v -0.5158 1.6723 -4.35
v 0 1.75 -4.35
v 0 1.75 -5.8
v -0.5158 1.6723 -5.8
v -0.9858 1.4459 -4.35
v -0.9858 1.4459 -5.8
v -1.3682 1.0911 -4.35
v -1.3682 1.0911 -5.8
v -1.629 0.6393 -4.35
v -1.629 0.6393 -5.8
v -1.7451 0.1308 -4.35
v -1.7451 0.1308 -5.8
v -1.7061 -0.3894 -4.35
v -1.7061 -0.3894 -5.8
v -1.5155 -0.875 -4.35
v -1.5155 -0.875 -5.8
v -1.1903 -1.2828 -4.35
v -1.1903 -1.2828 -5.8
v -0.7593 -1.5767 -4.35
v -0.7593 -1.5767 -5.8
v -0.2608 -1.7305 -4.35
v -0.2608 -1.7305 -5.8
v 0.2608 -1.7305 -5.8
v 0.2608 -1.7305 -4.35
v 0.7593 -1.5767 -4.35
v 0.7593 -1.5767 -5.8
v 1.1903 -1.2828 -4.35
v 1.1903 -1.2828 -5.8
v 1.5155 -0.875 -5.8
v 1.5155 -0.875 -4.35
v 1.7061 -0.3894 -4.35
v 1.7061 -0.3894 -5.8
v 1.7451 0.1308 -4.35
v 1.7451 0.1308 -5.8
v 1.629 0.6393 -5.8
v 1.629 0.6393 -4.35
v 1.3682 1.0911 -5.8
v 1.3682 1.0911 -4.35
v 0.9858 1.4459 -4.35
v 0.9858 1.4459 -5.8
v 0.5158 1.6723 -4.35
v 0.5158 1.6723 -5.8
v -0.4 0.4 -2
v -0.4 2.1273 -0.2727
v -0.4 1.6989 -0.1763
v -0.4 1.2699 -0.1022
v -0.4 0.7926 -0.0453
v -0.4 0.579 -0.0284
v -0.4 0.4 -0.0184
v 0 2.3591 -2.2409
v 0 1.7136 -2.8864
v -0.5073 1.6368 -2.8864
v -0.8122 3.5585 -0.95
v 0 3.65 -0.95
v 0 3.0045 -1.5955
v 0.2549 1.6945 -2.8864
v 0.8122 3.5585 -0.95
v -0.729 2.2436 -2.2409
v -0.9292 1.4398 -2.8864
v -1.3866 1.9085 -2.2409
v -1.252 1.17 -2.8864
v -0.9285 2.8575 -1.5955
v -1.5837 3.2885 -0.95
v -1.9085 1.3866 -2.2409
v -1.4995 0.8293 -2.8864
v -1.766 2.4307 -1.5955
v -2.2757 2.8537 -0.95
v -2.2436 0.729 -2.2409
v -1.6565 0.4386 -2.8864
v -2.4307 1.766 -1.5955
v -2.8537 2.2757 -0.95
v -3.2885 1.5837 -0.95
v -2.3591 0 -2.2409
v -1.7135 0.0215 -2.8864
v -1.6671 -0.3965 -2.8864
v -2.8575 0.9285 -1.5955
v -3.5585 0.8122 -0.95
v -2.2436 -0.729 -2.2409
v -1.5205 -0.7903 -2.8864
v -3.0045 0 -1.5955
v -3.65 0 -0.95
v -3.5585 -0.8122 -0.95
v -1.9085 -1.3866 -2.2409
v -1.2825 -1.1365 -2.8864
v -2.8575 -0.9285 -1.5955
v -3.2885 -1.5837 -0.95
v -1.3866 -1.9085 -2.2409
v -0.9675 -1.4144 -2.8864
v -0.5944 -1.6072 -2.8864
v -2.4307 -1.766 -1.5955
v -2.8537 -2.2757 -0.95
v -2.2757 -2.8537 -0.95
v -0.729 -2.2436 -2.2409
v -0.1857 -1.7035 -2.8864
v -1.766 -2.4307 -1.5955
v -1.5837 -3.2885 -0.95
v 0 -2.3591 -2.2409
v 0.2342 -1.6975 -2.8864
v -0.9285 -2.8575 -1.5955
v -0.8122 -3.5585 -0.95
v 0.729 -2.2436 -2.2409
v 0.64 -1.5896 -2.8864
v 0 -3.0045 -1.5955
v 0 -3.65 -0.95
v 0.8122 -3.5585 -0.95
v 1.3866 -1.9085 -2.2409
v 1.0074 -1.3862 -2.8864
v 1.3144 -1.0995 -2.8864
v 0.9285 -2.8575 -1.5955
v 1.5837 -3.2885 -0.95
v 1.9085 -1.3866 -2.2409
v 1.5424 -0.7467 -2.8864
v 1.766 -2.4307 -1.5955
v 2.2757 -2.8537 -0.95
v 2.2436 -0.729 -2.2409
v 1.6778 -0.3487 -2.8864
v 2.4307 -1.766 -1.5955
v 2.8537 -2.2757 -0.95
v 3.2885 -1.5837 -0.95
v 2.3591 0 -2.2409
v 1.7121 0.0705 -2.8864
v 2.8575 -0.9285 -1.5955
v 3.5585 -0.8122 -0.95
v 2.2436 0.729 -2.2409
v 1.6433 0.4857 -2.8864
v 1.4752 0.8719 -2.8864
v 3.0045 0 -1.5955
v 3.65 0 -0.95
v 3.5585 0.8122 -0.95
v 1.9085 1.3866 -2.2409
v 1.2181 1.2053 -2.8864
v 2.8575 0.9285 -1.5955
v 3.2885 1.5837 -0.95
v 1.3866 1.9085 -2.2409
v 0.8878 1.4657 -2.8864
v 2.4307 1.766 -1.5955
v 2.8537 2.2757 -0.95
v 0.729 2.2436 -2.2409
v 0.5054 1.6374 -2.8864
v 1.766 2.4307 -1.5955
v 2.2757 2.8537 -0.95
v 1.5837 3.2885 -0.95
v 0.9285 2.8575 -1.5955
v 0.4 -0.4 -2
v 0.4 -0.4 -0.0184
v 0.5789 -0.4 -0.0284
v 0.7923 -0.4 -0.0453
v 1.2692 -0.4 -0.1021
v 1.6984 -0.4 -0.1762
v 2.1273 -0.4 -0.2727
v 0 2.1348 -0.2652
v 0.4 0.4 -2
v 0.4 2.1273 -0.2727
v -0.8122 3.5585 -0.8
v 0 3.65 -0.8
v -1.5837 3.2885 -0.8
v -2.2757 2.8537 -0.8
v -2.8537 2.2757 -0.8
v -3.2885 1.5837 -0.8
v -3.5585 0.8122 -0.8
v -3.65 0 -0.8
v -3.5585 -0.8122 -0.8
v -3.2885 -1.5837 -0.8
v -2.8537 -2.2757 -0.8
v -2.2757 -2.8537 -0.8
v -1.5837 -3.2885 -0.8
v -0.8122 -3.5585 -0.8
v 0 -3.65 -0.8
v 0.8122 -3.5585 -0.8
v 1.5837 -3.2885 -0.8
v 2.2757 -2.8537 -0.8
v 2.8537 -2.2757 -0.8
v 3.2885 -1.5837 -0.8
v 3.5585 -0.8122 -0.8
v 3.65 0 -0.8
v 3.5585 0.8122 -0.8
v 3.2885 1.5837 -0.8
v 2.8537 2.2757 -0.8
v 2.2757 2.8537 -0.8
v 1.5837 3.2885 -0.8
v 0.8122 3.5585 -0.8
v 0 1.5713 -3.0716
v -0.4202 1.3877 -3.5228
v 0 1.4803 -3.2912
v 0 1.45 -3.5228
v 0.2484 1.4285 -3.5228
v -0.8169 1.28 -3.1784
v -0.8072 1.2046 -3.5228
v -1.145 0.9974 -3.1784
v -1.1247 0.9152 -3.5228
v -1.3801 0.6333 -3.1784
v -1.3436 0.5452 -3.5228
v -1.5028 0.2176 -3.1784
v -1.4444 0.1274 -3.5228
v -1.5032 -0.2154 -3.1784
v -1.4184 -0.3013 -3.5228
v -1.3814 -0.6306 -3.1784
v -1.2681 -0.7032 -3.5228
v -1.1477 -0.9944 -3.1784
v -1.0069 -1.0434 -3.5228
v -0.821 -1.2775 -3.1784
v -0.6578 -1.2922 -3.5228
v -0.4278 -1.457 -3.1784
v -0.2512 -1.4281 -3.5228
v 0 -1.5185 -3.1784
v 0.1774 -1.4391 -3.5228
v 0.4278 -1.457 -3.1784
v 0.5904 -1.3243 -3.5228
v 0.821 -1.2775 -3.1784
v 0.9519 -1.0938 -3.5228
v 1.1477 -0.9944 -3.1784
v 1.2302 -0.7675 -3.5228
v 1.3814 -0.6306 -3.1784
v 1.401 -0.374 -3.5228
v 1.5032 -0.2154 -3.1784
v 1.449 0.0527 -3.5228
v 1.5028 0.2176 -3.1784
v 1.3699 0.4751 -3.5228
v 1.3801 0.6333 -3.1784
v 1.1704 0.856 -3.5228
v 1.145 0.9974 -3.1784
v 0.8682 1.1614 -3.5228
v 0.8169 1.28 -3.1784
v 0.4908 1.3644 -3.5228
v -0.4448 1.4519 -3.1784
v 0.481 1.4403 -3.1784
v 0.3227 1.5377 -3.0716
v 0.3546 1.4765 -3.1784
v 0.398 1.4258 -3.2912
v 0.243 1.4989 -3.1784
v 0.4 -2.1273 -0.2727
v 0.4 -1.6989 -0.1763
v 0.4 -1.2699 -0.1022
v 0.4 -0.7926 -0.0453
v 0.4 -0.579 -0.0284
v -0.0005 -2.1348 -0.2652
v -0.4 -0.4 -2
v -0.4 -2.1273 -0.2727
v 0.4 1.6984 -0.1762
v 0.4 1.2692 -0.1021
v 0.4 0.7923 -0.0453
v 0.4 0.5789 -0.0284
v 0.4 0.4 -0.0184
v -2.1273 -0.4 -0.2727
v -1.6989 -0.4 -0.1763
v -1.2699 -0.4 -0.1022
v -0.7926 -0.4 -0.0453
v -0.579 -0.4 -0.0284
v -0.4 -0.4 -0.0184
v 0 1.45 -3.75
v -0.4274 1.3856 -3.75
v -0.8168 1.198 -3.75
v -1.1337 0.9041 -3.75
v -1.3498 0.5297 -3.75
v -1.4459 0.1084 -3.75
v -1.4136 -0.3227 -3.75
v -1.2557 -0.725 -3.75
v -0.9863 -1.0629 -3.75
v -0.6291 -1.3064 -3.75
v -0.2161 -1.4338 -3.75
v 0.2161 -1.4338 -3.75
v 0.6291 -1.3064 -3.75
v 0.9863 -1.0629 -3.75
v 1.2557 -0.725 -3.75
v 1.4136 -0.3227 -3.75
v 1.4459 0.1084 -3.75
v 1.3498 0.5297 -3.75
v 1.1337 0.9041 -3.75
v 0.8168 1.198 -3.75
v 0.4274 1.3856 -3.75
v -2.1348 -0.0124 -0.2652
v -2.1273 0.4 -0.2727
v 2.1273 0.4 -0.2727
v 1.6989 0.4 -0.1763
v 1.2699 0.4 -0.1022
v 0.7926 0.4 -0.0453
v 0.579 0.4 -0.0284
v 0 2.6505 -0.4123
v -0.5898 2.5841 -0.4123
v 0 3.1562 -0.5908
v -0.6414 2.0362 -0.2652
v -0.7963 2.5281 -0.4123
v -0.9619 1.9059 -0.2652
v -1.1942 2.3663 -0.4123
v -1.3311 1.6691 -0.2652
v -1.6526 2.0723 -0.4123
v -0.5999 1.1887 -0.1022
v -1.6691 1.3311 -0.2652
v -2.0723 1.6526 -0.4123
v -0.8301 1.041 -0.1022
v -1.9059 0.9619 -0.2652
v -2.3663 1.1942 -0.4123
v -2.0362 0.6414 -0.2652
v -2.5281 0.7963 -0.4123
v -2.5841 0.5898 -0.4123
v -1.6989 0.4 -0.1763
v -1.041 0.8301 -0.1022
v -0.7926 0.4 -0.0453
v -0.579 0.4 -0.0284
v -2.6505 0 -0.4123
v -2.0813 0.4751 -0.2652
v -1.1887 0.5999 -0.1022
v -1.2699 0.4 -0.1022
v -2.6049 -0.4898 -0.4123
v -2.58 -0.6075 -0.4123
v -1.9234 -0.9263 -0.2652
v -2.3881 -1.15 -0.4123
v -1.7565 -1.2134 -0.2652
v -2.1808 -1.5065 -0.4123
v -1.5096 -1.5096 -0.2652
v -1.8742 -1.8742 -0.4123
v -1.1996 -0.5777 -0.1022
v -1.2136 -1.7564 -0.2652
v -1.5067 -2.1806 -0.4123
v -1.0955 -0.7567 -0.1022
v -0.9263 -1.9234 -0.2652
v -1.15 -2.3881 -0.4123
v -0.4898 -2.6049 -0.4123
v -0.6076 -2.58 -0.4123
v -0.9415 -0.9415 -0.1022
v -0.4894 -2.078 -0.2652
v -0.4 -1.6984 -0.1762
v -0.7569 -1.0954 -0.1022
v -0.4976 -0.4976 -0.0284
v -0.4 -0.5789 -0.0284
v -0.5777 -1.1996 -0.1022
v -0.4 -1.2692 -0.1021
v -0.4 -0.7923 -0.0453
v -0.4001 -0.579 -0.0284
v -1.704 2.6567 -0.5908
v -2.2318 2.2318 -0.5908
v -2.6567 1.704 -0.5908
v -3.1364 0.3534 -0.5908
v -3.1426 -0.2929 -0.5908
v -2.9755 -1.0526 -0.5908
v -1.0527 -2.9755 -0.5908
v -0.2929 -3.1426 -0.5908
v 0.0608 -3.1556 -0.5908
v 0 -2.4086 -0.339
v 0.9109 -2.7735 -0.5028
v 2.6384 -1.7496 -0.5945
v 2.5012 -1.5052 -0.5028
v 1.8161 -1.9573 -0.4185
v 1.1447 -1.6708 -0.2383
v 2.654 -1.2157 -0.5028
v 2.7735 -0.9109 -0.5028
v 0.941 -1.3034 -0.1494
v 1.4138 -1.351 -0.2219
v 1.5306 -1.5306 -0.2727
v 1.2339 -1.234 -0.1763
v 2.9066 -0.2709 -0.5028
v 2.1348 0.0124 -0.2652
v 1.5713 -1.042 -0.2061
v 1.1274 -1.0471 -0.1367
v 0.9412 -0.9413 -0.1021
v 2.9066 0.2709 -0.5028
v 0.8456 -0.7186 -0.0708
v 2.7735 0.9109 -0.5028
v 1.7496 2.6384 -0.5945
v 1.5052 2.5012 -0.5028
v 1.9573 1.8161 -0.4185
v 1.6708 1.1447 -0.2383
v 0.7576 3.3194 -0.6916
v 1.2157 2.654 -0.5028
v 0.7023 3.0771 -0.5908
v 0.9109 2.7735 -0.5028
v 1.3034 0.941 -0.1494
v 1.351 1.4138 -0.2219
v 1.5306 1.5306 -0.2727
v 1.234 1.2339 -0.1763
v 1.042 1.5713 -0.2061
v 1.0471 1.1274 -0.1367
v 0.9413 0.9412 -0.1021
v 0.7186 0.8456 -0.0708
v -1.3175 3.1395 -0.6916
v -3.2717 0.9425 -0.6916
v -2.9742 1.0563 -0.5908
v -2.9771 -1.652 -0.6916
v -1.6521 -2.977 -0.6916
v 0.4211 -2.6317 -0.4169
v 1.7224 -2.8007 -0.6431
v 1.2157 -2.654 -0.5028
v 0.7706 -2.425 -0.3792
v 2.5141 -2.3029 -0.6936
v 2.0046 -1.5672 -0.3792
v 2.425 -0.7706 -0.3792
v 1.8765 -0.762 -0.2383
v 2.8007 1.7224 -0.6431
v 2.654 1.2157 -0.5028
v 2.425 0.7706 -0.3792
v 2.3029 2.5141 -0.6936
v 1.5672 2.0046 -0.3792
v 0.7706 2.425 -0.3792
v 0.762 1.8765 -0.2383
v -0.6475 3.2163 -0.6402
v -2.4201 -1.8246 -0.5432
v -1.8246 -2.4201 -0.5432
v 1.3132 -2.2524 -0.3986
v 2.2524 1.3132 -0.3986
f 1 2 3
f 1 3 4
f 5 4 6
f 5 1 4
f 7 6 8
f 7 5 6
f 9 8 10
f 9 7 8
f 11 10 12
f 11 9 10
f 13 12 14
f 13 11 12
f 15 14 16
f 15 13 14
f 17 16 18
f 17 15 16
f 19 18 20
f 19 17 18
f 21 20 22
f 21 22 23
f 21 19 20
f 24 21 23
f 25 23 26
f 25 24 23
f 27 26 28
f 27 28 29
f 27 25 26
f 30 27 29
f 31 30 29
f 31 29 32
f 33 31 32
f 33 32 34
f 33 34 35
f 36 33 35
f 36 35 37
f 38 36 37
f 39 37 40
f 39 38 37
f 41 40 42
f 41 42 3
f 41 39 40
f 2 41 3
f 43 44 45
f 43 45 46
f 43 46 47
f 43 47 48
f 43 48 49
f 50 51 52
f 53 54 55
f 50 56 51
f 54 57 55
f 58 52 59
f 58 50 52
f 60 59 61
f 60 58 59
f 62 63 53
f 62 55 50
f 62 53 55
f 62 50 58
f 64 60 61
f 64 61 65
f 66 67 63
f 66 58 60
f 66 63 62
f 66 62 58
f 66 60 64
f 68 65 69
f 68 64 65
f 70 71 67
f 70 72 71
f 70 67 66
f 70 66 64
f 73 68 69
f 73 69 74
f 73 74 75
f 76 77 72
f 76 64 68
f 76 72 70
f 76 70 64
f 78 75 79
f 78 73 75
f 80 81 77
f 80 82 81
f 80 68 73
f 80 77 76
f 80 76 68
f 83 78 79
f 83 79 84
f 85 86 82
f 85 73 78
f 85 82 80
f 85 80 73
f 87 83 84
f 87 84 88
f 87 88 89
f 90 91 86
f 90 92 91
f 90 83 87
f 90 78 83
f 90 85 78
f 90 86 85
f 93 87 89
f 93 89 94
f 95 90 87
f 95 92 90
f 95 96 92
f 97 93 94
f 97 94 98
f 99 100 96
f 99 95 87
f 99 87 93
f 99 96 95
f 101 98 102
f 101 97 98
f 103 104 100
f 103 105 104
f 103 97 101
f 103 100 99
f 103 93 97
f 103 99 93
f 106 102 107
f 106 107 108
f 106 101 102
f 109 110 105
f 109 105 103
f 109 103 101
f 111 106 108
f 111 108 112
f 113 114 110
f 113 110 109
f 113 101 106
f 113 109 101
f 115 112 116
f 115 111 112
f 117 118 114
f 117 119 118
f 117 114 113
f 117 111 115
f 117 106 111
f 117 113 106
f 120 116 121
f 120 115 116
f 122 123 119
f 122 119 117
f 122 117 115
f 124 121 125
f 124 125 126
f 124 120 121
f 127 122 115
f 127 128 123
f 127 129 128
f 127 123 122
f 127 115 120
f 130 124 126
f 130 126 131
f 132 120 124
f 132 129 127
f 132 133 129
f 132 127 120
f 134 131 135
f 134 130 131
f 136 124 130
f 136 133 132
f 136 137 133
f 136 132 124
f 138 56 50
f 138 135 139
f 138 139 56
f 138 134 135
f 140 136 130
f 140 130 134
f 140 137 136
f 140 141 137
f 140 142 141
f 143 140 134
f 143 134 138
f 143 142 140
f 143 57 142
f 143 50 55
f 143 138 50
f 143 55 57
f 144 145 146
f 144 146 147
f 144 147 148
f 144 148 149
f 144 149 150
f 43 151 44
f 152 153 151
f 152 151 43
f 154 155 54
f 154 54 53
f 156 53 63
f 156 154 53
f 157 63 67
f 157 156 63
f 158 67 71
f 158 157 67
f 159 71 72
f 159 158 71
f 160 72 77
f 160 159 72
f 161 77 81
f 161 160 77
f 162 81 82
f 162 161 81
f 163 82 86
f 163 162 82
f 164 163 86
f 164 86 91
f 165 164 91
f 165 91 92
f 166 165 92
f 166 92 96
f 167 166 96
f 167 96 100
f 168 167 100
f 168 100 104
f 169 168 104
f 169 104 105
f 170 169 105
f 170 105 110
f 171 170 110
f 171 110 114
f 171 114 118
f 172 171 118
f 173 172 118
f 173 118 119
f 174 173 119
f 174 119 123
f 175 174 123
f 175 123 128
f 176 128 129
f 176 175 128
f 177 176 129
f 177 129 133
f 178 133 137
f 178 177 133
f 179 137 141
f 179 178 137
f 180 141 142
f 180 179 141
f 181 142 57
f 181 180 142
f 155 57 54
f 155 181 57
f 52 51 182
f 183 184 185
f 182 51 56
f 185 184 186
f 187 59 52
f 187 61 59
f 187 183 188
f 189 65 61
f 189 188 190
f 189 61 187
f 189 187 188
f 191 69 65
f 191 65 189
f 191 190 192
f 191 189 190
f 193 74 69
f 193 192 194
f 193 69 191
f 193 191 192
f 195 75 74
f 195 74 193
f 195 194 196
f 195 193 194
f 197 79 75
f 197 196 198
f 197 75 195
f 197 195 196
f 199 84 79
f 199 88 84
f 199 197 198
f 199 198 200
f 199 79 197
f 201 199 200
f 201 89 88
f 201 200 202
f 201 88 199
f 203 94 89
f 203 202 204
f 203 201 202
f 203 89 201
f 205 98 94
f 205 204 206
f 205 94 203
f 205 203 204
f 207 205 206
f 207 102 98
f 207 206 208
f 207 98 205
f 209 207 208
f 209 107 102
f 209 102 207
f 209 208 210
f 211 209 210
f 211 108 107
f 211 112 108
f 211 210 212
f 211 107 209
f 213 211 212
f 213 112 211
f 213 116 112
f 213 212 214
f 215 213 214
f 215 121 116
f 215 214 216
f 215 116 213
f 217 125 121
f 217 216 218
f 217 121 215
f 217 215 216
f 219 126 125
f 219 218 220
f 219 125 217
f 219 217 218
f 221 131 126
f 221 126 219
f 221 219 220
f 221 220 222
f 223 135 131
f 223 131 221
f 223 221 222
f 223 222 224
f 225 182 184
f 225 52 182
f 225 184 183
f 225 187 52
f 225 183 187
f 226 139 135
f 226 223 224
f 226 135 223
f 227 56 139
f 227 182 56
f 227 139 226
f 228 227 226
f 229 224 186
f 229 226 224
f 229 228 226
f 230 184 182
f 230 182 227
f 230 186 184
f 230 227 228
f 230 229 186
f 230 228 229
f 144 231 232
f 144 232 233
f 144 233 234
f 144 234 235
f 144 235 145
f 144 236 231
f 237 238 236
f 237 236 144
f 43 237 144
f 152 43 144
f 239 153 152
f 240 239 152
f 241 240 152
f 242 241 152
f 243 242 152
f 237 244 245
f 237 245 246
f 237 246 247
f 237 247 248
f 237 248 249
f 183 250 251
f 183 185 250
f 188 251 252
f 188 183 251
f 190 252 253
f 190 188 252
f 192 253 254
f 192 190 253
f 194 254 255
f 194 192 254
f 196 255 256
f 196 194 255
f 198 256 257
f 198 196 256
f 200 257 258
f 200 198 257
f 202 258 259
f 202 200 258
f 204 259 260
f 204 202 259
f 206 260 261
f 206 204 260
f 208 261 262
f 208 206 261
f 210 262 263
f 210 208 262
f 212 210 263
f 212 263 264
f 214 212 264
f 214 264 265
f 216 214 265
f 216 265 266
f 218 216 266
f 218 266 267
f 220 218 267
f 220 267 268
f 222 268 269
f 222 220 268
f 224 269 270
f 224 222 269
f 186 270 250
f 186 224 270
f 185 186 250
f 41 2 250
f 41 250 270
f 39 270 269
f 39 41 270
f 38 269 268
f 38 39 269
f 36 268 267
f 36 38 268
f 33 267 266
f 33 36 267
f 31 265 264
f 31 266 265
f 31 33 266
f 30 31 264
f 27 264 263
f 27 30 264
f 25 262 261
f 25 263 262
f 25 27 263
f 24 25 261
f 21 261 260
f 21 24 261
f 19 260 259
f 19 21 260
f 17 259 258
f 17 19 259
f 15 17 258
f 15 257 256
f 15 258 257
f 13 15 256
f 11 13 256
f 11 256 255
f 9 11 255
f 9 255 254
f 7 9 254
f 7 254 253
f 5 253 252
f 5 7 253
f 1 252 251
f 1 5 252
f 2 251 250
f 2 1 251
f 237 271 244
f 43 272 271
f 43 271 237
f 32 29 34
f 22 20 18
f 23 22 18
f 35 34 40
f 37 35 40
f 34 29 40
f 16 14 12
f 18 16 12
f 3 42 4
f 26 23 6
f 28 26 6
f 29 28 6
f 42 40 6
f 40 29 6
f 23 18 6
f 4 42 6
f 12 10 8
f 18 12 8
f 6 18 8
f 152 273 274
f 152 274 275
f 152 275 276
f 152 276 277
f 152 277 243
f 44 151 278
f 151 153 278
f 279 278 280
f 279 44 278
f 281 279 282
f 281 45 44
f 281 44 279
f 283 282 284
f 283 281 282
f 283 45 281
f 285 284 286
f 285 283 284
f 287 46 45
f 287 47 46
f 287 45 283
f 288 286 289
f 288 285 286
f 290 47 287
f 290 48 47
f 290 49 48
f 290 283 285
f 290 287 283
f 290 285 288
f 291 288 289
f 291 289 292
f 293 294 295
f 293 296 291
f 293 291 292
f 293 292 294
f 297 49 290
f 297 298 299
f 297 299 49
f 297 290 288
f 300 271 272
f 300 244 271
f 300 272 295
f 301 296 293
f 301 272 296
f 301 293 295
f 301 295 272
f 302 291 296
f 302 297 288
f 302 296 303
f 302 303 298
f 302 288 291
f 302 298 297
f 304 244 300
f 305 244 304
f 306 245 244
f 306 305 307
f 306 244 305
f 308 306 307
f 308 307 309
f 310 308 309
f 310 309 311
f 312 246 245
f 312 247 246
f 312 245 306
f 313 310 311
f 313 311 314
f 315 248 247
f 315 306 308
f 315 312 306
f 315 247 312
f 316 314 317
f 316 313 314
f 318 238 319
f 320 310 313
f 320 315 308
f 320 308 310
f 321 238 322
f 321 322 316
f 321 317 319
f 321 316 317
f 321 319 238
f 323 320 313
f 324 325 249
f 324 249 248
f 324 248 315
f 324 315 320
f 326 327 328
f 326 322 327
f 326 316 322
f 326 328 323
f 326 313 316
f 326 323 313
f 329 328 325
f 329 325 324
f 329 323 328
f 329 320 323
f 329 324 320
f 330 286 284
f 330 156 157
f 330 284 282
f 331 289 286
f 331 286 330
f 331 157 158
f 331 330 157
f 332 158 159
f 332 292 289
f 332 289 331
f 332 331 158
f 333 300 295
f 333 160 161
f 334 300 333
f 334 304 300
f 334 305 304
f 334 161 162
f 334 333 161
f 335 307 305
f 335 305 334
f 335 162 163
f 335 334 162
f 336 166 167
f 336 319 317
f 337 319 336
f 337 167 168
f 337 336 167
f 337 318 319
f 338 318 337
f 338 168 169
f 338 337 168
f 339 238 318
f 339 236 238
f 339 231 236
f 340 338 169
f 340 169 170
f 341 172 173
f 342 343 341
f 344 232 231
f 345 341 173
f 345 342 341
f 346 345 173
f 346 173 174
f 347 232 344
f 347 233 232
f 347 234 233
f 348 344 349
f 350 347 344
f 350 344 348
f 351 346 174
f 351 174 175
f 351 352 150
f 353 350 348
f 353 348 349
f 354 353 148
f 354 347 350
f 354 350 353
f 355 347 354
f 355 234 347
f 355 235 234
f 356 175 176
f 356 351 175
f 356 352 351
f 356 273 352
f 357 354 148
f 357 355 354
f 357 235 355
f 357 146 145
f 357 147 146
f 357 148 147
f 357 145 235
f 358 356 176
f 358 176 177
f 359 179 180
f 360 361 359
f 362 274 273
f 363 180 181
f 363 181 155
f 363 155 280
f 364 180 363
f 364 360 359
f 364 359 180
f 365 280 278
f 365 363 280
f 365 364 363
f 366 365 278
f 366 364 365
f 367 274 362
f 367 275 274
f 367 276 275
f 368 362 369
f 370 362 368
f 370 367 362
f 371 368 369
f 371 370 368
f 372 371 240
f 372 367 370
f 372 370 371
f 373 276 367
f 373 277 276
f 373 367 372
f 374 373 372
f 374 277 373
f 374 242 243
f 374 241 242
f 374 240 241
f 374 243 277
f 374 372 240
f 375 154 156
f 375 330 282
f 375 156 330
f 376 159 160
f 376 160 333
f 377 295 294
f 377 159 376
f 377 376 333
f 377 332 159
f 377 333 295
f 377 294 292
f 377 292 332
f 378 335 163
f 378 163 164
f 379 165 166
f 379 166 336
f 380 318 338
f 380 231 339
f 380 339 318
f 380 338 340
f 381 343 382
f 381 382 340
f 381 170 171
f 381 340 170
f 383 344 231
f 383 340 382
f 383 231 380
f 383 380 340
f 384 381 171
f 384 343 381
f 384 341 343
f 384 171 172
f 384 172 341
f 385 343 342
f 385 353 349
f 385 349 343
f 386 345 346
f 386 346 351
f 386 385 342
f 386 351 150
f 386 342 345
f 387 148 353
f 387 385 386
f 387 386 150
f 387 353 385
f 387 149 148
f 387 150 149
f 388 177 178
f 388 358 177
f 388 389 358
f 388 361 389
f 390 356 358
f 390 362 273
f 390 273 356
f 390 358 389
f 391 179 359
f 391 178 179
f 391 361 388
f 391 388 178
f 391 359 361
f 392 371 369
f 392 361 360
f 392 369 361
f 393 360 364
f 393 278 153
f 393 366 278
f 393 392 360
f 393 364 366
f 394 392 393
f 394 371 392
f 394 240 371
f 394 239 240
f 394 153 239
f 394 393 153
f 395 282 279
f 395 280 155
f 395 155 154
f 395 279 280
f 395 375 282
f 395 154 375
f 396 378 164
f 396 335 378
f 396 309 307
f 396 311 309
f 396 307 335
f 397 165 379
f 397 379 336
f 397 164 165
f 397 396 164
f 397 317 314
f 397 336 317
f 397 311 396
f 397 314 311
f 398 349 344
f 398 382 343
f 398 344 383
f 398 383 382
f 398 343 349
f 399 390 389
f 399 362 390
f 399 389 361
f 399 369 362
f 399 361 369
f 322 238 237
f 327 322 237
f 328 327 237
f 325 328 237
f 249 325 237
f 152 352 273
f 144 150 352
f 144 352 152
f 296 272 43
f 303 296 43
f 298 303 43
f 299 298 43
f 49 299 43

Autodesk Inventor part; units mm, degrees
ref_plane "WorkPlane2" through (0, 0, 0) normal (0, 0, 1) x (1, 0, 0)
sketch "Sketch1" plane through (0, 0, 0) normal (1, 0, 0) x (0, 1, 0)
  point P0 (0, 0)
ref_plane "Work Plane2" through (0, 0, -3.15) normal (0, 0, 1) x (1, 0, 0)
ref_plane "WorkPlane3" through (0, 0, 7) normal (0, 0, 1) x (1, 0, 0)
sketch "Sketch2" plane through (0, 0, 0) normal (0, 1, 0) x (-1, 0, 0)
  point P0 (0, 0)
sketch "Sketch3" plane through (0, 0, 0) normal (1, 0, 0) x (0, 1, 0)
  line L0 (1.75, -4.35) -> (1.45, -3.75)
  line L1 (1.75, -5.8) -> (1.75, -4.35)
  line L2 (0, -5.8) -> (1.75, -5.8)
  line L3 (0, 0) -> (0, -5.8)
  arc A0 (3.65, -0.8) -> (0, 0) centre (0, -8.7266) ccw
  line L4 (3.65, -0.95) -> (3.65, -0.8)
  line L5 (1.45, -3.15) -> (3.65, -0.95)
  line L6 (1.45, -3.75) -> (1.45, -3.15)
  line L7 (0, -31.6445) -> (0, 31.6445) construction
  line L8 (0, -31.6445) -> (0, 31.6445)
  line L9 (0, -44.3023) -> (0, 44.3023) projected
  dimension "d2" = 1.75
  dimension "d4" = 1.45
  dimension "d6" = 0.6
  dimension "d8" = 2.35
  dimension "d10" = 135
  dimension "d12" = 3.65
  dimension "d14" = 0
  dimension "d16" = 0.8
  dimension "d18" = 5
  dimension "d22" = 1.45
revolve "Revolution1" add sketch "Sketch3" angle 360 about axis through (0, 0, -31.6445) along (0, 0, 1)
fillet "Fillet1" radius 0.9 1 edges at (0, -1.45, -3.15)
sketch "Sketch4" plane through (0, 0, 0) normal (0, 1, 0) x (-1, 0, 0)
  line L0 (0, 0) -> (-2.4, 0)
  line L1 (0, -2) -> (0, 0)
  line L2 (-2.4, 0) -> (-0.4, -2)
  line L3 (0, -10.4719) -> (0, 1.7453) projected
  arc A0 (3.65, -0.8) -> (-3.65, -0.8) centre (0, -8.7266) ccw projected
  line L4 (0, -2) -> (-0.4, -2)
  point P0 (0, -2.4)
  dimension "d30" = 45
  dimension "d33" = 4.8
  dimension "d34" = 0.4
  dimension "d35" = 90
extrude "Extrusion1" cut sketch "Sketch4" along normal mid plane 0.8
pattern_circular "PolarArray1" count 4 over 360 about axis through (0, 0, -10) along (0, 0, 1) of "Extrusion1"
thread "Thread1" size "M3.5x0.6" class "6g" standard "ISO Metric profile" full length
ref_plane "MSC_PF1" through (0, 0, 0) normal (1, 0, 0) x (0, 1, 0)
ref_plane "MSC_PT1" through (0, 3.65, -0.95) normal (0, 0, -1) x (-1, 0, 0)
equation "\"d2\" = 0.5 * NND"
equation "\"d4\" = 0.5 * msp_mdtds"
equation "\"d6\" = msp_x"
equation "\"d8\" = ParK"
equation "\"d12\" = 0.5 * Dk"
equation "\"d16\" = ParF"
equation "\"d18\" = NLG"
equation "\"d22\" = b"
equation "\"d24\" = r"
equation "\"d33\" = M"
equation "\"d34\" = 0.0833333 * M"
equation "\"d31\" = 0.166667 * M"
equation "\"d39\" = b"
equation "\"PTC\" = 0.6"
equation "\"msp_x\" = PTC"
equation "\"NLG\" = 5"
equation "\"NND\" = 3.5"
equation "\"ParK\" = 2.35"
equation "\"r\" = 0.9"
equation "\"msp_mdtds\" = NND - PTC"
equation "\"b\" = 1.45"
equation "\"Dk\" = 7.3"
equation "\"ParF\" = 0.8"
equation "\"M\" = 4.8"
equation "\"ParA\" = 1.2"
equation "\"THREADDIA\" = NND"
equation "\"TEMPLATE\" = 1.2345"
properties part number "ISO 7047 - M3.5x5 - 4.8 - H" material "Steel"
